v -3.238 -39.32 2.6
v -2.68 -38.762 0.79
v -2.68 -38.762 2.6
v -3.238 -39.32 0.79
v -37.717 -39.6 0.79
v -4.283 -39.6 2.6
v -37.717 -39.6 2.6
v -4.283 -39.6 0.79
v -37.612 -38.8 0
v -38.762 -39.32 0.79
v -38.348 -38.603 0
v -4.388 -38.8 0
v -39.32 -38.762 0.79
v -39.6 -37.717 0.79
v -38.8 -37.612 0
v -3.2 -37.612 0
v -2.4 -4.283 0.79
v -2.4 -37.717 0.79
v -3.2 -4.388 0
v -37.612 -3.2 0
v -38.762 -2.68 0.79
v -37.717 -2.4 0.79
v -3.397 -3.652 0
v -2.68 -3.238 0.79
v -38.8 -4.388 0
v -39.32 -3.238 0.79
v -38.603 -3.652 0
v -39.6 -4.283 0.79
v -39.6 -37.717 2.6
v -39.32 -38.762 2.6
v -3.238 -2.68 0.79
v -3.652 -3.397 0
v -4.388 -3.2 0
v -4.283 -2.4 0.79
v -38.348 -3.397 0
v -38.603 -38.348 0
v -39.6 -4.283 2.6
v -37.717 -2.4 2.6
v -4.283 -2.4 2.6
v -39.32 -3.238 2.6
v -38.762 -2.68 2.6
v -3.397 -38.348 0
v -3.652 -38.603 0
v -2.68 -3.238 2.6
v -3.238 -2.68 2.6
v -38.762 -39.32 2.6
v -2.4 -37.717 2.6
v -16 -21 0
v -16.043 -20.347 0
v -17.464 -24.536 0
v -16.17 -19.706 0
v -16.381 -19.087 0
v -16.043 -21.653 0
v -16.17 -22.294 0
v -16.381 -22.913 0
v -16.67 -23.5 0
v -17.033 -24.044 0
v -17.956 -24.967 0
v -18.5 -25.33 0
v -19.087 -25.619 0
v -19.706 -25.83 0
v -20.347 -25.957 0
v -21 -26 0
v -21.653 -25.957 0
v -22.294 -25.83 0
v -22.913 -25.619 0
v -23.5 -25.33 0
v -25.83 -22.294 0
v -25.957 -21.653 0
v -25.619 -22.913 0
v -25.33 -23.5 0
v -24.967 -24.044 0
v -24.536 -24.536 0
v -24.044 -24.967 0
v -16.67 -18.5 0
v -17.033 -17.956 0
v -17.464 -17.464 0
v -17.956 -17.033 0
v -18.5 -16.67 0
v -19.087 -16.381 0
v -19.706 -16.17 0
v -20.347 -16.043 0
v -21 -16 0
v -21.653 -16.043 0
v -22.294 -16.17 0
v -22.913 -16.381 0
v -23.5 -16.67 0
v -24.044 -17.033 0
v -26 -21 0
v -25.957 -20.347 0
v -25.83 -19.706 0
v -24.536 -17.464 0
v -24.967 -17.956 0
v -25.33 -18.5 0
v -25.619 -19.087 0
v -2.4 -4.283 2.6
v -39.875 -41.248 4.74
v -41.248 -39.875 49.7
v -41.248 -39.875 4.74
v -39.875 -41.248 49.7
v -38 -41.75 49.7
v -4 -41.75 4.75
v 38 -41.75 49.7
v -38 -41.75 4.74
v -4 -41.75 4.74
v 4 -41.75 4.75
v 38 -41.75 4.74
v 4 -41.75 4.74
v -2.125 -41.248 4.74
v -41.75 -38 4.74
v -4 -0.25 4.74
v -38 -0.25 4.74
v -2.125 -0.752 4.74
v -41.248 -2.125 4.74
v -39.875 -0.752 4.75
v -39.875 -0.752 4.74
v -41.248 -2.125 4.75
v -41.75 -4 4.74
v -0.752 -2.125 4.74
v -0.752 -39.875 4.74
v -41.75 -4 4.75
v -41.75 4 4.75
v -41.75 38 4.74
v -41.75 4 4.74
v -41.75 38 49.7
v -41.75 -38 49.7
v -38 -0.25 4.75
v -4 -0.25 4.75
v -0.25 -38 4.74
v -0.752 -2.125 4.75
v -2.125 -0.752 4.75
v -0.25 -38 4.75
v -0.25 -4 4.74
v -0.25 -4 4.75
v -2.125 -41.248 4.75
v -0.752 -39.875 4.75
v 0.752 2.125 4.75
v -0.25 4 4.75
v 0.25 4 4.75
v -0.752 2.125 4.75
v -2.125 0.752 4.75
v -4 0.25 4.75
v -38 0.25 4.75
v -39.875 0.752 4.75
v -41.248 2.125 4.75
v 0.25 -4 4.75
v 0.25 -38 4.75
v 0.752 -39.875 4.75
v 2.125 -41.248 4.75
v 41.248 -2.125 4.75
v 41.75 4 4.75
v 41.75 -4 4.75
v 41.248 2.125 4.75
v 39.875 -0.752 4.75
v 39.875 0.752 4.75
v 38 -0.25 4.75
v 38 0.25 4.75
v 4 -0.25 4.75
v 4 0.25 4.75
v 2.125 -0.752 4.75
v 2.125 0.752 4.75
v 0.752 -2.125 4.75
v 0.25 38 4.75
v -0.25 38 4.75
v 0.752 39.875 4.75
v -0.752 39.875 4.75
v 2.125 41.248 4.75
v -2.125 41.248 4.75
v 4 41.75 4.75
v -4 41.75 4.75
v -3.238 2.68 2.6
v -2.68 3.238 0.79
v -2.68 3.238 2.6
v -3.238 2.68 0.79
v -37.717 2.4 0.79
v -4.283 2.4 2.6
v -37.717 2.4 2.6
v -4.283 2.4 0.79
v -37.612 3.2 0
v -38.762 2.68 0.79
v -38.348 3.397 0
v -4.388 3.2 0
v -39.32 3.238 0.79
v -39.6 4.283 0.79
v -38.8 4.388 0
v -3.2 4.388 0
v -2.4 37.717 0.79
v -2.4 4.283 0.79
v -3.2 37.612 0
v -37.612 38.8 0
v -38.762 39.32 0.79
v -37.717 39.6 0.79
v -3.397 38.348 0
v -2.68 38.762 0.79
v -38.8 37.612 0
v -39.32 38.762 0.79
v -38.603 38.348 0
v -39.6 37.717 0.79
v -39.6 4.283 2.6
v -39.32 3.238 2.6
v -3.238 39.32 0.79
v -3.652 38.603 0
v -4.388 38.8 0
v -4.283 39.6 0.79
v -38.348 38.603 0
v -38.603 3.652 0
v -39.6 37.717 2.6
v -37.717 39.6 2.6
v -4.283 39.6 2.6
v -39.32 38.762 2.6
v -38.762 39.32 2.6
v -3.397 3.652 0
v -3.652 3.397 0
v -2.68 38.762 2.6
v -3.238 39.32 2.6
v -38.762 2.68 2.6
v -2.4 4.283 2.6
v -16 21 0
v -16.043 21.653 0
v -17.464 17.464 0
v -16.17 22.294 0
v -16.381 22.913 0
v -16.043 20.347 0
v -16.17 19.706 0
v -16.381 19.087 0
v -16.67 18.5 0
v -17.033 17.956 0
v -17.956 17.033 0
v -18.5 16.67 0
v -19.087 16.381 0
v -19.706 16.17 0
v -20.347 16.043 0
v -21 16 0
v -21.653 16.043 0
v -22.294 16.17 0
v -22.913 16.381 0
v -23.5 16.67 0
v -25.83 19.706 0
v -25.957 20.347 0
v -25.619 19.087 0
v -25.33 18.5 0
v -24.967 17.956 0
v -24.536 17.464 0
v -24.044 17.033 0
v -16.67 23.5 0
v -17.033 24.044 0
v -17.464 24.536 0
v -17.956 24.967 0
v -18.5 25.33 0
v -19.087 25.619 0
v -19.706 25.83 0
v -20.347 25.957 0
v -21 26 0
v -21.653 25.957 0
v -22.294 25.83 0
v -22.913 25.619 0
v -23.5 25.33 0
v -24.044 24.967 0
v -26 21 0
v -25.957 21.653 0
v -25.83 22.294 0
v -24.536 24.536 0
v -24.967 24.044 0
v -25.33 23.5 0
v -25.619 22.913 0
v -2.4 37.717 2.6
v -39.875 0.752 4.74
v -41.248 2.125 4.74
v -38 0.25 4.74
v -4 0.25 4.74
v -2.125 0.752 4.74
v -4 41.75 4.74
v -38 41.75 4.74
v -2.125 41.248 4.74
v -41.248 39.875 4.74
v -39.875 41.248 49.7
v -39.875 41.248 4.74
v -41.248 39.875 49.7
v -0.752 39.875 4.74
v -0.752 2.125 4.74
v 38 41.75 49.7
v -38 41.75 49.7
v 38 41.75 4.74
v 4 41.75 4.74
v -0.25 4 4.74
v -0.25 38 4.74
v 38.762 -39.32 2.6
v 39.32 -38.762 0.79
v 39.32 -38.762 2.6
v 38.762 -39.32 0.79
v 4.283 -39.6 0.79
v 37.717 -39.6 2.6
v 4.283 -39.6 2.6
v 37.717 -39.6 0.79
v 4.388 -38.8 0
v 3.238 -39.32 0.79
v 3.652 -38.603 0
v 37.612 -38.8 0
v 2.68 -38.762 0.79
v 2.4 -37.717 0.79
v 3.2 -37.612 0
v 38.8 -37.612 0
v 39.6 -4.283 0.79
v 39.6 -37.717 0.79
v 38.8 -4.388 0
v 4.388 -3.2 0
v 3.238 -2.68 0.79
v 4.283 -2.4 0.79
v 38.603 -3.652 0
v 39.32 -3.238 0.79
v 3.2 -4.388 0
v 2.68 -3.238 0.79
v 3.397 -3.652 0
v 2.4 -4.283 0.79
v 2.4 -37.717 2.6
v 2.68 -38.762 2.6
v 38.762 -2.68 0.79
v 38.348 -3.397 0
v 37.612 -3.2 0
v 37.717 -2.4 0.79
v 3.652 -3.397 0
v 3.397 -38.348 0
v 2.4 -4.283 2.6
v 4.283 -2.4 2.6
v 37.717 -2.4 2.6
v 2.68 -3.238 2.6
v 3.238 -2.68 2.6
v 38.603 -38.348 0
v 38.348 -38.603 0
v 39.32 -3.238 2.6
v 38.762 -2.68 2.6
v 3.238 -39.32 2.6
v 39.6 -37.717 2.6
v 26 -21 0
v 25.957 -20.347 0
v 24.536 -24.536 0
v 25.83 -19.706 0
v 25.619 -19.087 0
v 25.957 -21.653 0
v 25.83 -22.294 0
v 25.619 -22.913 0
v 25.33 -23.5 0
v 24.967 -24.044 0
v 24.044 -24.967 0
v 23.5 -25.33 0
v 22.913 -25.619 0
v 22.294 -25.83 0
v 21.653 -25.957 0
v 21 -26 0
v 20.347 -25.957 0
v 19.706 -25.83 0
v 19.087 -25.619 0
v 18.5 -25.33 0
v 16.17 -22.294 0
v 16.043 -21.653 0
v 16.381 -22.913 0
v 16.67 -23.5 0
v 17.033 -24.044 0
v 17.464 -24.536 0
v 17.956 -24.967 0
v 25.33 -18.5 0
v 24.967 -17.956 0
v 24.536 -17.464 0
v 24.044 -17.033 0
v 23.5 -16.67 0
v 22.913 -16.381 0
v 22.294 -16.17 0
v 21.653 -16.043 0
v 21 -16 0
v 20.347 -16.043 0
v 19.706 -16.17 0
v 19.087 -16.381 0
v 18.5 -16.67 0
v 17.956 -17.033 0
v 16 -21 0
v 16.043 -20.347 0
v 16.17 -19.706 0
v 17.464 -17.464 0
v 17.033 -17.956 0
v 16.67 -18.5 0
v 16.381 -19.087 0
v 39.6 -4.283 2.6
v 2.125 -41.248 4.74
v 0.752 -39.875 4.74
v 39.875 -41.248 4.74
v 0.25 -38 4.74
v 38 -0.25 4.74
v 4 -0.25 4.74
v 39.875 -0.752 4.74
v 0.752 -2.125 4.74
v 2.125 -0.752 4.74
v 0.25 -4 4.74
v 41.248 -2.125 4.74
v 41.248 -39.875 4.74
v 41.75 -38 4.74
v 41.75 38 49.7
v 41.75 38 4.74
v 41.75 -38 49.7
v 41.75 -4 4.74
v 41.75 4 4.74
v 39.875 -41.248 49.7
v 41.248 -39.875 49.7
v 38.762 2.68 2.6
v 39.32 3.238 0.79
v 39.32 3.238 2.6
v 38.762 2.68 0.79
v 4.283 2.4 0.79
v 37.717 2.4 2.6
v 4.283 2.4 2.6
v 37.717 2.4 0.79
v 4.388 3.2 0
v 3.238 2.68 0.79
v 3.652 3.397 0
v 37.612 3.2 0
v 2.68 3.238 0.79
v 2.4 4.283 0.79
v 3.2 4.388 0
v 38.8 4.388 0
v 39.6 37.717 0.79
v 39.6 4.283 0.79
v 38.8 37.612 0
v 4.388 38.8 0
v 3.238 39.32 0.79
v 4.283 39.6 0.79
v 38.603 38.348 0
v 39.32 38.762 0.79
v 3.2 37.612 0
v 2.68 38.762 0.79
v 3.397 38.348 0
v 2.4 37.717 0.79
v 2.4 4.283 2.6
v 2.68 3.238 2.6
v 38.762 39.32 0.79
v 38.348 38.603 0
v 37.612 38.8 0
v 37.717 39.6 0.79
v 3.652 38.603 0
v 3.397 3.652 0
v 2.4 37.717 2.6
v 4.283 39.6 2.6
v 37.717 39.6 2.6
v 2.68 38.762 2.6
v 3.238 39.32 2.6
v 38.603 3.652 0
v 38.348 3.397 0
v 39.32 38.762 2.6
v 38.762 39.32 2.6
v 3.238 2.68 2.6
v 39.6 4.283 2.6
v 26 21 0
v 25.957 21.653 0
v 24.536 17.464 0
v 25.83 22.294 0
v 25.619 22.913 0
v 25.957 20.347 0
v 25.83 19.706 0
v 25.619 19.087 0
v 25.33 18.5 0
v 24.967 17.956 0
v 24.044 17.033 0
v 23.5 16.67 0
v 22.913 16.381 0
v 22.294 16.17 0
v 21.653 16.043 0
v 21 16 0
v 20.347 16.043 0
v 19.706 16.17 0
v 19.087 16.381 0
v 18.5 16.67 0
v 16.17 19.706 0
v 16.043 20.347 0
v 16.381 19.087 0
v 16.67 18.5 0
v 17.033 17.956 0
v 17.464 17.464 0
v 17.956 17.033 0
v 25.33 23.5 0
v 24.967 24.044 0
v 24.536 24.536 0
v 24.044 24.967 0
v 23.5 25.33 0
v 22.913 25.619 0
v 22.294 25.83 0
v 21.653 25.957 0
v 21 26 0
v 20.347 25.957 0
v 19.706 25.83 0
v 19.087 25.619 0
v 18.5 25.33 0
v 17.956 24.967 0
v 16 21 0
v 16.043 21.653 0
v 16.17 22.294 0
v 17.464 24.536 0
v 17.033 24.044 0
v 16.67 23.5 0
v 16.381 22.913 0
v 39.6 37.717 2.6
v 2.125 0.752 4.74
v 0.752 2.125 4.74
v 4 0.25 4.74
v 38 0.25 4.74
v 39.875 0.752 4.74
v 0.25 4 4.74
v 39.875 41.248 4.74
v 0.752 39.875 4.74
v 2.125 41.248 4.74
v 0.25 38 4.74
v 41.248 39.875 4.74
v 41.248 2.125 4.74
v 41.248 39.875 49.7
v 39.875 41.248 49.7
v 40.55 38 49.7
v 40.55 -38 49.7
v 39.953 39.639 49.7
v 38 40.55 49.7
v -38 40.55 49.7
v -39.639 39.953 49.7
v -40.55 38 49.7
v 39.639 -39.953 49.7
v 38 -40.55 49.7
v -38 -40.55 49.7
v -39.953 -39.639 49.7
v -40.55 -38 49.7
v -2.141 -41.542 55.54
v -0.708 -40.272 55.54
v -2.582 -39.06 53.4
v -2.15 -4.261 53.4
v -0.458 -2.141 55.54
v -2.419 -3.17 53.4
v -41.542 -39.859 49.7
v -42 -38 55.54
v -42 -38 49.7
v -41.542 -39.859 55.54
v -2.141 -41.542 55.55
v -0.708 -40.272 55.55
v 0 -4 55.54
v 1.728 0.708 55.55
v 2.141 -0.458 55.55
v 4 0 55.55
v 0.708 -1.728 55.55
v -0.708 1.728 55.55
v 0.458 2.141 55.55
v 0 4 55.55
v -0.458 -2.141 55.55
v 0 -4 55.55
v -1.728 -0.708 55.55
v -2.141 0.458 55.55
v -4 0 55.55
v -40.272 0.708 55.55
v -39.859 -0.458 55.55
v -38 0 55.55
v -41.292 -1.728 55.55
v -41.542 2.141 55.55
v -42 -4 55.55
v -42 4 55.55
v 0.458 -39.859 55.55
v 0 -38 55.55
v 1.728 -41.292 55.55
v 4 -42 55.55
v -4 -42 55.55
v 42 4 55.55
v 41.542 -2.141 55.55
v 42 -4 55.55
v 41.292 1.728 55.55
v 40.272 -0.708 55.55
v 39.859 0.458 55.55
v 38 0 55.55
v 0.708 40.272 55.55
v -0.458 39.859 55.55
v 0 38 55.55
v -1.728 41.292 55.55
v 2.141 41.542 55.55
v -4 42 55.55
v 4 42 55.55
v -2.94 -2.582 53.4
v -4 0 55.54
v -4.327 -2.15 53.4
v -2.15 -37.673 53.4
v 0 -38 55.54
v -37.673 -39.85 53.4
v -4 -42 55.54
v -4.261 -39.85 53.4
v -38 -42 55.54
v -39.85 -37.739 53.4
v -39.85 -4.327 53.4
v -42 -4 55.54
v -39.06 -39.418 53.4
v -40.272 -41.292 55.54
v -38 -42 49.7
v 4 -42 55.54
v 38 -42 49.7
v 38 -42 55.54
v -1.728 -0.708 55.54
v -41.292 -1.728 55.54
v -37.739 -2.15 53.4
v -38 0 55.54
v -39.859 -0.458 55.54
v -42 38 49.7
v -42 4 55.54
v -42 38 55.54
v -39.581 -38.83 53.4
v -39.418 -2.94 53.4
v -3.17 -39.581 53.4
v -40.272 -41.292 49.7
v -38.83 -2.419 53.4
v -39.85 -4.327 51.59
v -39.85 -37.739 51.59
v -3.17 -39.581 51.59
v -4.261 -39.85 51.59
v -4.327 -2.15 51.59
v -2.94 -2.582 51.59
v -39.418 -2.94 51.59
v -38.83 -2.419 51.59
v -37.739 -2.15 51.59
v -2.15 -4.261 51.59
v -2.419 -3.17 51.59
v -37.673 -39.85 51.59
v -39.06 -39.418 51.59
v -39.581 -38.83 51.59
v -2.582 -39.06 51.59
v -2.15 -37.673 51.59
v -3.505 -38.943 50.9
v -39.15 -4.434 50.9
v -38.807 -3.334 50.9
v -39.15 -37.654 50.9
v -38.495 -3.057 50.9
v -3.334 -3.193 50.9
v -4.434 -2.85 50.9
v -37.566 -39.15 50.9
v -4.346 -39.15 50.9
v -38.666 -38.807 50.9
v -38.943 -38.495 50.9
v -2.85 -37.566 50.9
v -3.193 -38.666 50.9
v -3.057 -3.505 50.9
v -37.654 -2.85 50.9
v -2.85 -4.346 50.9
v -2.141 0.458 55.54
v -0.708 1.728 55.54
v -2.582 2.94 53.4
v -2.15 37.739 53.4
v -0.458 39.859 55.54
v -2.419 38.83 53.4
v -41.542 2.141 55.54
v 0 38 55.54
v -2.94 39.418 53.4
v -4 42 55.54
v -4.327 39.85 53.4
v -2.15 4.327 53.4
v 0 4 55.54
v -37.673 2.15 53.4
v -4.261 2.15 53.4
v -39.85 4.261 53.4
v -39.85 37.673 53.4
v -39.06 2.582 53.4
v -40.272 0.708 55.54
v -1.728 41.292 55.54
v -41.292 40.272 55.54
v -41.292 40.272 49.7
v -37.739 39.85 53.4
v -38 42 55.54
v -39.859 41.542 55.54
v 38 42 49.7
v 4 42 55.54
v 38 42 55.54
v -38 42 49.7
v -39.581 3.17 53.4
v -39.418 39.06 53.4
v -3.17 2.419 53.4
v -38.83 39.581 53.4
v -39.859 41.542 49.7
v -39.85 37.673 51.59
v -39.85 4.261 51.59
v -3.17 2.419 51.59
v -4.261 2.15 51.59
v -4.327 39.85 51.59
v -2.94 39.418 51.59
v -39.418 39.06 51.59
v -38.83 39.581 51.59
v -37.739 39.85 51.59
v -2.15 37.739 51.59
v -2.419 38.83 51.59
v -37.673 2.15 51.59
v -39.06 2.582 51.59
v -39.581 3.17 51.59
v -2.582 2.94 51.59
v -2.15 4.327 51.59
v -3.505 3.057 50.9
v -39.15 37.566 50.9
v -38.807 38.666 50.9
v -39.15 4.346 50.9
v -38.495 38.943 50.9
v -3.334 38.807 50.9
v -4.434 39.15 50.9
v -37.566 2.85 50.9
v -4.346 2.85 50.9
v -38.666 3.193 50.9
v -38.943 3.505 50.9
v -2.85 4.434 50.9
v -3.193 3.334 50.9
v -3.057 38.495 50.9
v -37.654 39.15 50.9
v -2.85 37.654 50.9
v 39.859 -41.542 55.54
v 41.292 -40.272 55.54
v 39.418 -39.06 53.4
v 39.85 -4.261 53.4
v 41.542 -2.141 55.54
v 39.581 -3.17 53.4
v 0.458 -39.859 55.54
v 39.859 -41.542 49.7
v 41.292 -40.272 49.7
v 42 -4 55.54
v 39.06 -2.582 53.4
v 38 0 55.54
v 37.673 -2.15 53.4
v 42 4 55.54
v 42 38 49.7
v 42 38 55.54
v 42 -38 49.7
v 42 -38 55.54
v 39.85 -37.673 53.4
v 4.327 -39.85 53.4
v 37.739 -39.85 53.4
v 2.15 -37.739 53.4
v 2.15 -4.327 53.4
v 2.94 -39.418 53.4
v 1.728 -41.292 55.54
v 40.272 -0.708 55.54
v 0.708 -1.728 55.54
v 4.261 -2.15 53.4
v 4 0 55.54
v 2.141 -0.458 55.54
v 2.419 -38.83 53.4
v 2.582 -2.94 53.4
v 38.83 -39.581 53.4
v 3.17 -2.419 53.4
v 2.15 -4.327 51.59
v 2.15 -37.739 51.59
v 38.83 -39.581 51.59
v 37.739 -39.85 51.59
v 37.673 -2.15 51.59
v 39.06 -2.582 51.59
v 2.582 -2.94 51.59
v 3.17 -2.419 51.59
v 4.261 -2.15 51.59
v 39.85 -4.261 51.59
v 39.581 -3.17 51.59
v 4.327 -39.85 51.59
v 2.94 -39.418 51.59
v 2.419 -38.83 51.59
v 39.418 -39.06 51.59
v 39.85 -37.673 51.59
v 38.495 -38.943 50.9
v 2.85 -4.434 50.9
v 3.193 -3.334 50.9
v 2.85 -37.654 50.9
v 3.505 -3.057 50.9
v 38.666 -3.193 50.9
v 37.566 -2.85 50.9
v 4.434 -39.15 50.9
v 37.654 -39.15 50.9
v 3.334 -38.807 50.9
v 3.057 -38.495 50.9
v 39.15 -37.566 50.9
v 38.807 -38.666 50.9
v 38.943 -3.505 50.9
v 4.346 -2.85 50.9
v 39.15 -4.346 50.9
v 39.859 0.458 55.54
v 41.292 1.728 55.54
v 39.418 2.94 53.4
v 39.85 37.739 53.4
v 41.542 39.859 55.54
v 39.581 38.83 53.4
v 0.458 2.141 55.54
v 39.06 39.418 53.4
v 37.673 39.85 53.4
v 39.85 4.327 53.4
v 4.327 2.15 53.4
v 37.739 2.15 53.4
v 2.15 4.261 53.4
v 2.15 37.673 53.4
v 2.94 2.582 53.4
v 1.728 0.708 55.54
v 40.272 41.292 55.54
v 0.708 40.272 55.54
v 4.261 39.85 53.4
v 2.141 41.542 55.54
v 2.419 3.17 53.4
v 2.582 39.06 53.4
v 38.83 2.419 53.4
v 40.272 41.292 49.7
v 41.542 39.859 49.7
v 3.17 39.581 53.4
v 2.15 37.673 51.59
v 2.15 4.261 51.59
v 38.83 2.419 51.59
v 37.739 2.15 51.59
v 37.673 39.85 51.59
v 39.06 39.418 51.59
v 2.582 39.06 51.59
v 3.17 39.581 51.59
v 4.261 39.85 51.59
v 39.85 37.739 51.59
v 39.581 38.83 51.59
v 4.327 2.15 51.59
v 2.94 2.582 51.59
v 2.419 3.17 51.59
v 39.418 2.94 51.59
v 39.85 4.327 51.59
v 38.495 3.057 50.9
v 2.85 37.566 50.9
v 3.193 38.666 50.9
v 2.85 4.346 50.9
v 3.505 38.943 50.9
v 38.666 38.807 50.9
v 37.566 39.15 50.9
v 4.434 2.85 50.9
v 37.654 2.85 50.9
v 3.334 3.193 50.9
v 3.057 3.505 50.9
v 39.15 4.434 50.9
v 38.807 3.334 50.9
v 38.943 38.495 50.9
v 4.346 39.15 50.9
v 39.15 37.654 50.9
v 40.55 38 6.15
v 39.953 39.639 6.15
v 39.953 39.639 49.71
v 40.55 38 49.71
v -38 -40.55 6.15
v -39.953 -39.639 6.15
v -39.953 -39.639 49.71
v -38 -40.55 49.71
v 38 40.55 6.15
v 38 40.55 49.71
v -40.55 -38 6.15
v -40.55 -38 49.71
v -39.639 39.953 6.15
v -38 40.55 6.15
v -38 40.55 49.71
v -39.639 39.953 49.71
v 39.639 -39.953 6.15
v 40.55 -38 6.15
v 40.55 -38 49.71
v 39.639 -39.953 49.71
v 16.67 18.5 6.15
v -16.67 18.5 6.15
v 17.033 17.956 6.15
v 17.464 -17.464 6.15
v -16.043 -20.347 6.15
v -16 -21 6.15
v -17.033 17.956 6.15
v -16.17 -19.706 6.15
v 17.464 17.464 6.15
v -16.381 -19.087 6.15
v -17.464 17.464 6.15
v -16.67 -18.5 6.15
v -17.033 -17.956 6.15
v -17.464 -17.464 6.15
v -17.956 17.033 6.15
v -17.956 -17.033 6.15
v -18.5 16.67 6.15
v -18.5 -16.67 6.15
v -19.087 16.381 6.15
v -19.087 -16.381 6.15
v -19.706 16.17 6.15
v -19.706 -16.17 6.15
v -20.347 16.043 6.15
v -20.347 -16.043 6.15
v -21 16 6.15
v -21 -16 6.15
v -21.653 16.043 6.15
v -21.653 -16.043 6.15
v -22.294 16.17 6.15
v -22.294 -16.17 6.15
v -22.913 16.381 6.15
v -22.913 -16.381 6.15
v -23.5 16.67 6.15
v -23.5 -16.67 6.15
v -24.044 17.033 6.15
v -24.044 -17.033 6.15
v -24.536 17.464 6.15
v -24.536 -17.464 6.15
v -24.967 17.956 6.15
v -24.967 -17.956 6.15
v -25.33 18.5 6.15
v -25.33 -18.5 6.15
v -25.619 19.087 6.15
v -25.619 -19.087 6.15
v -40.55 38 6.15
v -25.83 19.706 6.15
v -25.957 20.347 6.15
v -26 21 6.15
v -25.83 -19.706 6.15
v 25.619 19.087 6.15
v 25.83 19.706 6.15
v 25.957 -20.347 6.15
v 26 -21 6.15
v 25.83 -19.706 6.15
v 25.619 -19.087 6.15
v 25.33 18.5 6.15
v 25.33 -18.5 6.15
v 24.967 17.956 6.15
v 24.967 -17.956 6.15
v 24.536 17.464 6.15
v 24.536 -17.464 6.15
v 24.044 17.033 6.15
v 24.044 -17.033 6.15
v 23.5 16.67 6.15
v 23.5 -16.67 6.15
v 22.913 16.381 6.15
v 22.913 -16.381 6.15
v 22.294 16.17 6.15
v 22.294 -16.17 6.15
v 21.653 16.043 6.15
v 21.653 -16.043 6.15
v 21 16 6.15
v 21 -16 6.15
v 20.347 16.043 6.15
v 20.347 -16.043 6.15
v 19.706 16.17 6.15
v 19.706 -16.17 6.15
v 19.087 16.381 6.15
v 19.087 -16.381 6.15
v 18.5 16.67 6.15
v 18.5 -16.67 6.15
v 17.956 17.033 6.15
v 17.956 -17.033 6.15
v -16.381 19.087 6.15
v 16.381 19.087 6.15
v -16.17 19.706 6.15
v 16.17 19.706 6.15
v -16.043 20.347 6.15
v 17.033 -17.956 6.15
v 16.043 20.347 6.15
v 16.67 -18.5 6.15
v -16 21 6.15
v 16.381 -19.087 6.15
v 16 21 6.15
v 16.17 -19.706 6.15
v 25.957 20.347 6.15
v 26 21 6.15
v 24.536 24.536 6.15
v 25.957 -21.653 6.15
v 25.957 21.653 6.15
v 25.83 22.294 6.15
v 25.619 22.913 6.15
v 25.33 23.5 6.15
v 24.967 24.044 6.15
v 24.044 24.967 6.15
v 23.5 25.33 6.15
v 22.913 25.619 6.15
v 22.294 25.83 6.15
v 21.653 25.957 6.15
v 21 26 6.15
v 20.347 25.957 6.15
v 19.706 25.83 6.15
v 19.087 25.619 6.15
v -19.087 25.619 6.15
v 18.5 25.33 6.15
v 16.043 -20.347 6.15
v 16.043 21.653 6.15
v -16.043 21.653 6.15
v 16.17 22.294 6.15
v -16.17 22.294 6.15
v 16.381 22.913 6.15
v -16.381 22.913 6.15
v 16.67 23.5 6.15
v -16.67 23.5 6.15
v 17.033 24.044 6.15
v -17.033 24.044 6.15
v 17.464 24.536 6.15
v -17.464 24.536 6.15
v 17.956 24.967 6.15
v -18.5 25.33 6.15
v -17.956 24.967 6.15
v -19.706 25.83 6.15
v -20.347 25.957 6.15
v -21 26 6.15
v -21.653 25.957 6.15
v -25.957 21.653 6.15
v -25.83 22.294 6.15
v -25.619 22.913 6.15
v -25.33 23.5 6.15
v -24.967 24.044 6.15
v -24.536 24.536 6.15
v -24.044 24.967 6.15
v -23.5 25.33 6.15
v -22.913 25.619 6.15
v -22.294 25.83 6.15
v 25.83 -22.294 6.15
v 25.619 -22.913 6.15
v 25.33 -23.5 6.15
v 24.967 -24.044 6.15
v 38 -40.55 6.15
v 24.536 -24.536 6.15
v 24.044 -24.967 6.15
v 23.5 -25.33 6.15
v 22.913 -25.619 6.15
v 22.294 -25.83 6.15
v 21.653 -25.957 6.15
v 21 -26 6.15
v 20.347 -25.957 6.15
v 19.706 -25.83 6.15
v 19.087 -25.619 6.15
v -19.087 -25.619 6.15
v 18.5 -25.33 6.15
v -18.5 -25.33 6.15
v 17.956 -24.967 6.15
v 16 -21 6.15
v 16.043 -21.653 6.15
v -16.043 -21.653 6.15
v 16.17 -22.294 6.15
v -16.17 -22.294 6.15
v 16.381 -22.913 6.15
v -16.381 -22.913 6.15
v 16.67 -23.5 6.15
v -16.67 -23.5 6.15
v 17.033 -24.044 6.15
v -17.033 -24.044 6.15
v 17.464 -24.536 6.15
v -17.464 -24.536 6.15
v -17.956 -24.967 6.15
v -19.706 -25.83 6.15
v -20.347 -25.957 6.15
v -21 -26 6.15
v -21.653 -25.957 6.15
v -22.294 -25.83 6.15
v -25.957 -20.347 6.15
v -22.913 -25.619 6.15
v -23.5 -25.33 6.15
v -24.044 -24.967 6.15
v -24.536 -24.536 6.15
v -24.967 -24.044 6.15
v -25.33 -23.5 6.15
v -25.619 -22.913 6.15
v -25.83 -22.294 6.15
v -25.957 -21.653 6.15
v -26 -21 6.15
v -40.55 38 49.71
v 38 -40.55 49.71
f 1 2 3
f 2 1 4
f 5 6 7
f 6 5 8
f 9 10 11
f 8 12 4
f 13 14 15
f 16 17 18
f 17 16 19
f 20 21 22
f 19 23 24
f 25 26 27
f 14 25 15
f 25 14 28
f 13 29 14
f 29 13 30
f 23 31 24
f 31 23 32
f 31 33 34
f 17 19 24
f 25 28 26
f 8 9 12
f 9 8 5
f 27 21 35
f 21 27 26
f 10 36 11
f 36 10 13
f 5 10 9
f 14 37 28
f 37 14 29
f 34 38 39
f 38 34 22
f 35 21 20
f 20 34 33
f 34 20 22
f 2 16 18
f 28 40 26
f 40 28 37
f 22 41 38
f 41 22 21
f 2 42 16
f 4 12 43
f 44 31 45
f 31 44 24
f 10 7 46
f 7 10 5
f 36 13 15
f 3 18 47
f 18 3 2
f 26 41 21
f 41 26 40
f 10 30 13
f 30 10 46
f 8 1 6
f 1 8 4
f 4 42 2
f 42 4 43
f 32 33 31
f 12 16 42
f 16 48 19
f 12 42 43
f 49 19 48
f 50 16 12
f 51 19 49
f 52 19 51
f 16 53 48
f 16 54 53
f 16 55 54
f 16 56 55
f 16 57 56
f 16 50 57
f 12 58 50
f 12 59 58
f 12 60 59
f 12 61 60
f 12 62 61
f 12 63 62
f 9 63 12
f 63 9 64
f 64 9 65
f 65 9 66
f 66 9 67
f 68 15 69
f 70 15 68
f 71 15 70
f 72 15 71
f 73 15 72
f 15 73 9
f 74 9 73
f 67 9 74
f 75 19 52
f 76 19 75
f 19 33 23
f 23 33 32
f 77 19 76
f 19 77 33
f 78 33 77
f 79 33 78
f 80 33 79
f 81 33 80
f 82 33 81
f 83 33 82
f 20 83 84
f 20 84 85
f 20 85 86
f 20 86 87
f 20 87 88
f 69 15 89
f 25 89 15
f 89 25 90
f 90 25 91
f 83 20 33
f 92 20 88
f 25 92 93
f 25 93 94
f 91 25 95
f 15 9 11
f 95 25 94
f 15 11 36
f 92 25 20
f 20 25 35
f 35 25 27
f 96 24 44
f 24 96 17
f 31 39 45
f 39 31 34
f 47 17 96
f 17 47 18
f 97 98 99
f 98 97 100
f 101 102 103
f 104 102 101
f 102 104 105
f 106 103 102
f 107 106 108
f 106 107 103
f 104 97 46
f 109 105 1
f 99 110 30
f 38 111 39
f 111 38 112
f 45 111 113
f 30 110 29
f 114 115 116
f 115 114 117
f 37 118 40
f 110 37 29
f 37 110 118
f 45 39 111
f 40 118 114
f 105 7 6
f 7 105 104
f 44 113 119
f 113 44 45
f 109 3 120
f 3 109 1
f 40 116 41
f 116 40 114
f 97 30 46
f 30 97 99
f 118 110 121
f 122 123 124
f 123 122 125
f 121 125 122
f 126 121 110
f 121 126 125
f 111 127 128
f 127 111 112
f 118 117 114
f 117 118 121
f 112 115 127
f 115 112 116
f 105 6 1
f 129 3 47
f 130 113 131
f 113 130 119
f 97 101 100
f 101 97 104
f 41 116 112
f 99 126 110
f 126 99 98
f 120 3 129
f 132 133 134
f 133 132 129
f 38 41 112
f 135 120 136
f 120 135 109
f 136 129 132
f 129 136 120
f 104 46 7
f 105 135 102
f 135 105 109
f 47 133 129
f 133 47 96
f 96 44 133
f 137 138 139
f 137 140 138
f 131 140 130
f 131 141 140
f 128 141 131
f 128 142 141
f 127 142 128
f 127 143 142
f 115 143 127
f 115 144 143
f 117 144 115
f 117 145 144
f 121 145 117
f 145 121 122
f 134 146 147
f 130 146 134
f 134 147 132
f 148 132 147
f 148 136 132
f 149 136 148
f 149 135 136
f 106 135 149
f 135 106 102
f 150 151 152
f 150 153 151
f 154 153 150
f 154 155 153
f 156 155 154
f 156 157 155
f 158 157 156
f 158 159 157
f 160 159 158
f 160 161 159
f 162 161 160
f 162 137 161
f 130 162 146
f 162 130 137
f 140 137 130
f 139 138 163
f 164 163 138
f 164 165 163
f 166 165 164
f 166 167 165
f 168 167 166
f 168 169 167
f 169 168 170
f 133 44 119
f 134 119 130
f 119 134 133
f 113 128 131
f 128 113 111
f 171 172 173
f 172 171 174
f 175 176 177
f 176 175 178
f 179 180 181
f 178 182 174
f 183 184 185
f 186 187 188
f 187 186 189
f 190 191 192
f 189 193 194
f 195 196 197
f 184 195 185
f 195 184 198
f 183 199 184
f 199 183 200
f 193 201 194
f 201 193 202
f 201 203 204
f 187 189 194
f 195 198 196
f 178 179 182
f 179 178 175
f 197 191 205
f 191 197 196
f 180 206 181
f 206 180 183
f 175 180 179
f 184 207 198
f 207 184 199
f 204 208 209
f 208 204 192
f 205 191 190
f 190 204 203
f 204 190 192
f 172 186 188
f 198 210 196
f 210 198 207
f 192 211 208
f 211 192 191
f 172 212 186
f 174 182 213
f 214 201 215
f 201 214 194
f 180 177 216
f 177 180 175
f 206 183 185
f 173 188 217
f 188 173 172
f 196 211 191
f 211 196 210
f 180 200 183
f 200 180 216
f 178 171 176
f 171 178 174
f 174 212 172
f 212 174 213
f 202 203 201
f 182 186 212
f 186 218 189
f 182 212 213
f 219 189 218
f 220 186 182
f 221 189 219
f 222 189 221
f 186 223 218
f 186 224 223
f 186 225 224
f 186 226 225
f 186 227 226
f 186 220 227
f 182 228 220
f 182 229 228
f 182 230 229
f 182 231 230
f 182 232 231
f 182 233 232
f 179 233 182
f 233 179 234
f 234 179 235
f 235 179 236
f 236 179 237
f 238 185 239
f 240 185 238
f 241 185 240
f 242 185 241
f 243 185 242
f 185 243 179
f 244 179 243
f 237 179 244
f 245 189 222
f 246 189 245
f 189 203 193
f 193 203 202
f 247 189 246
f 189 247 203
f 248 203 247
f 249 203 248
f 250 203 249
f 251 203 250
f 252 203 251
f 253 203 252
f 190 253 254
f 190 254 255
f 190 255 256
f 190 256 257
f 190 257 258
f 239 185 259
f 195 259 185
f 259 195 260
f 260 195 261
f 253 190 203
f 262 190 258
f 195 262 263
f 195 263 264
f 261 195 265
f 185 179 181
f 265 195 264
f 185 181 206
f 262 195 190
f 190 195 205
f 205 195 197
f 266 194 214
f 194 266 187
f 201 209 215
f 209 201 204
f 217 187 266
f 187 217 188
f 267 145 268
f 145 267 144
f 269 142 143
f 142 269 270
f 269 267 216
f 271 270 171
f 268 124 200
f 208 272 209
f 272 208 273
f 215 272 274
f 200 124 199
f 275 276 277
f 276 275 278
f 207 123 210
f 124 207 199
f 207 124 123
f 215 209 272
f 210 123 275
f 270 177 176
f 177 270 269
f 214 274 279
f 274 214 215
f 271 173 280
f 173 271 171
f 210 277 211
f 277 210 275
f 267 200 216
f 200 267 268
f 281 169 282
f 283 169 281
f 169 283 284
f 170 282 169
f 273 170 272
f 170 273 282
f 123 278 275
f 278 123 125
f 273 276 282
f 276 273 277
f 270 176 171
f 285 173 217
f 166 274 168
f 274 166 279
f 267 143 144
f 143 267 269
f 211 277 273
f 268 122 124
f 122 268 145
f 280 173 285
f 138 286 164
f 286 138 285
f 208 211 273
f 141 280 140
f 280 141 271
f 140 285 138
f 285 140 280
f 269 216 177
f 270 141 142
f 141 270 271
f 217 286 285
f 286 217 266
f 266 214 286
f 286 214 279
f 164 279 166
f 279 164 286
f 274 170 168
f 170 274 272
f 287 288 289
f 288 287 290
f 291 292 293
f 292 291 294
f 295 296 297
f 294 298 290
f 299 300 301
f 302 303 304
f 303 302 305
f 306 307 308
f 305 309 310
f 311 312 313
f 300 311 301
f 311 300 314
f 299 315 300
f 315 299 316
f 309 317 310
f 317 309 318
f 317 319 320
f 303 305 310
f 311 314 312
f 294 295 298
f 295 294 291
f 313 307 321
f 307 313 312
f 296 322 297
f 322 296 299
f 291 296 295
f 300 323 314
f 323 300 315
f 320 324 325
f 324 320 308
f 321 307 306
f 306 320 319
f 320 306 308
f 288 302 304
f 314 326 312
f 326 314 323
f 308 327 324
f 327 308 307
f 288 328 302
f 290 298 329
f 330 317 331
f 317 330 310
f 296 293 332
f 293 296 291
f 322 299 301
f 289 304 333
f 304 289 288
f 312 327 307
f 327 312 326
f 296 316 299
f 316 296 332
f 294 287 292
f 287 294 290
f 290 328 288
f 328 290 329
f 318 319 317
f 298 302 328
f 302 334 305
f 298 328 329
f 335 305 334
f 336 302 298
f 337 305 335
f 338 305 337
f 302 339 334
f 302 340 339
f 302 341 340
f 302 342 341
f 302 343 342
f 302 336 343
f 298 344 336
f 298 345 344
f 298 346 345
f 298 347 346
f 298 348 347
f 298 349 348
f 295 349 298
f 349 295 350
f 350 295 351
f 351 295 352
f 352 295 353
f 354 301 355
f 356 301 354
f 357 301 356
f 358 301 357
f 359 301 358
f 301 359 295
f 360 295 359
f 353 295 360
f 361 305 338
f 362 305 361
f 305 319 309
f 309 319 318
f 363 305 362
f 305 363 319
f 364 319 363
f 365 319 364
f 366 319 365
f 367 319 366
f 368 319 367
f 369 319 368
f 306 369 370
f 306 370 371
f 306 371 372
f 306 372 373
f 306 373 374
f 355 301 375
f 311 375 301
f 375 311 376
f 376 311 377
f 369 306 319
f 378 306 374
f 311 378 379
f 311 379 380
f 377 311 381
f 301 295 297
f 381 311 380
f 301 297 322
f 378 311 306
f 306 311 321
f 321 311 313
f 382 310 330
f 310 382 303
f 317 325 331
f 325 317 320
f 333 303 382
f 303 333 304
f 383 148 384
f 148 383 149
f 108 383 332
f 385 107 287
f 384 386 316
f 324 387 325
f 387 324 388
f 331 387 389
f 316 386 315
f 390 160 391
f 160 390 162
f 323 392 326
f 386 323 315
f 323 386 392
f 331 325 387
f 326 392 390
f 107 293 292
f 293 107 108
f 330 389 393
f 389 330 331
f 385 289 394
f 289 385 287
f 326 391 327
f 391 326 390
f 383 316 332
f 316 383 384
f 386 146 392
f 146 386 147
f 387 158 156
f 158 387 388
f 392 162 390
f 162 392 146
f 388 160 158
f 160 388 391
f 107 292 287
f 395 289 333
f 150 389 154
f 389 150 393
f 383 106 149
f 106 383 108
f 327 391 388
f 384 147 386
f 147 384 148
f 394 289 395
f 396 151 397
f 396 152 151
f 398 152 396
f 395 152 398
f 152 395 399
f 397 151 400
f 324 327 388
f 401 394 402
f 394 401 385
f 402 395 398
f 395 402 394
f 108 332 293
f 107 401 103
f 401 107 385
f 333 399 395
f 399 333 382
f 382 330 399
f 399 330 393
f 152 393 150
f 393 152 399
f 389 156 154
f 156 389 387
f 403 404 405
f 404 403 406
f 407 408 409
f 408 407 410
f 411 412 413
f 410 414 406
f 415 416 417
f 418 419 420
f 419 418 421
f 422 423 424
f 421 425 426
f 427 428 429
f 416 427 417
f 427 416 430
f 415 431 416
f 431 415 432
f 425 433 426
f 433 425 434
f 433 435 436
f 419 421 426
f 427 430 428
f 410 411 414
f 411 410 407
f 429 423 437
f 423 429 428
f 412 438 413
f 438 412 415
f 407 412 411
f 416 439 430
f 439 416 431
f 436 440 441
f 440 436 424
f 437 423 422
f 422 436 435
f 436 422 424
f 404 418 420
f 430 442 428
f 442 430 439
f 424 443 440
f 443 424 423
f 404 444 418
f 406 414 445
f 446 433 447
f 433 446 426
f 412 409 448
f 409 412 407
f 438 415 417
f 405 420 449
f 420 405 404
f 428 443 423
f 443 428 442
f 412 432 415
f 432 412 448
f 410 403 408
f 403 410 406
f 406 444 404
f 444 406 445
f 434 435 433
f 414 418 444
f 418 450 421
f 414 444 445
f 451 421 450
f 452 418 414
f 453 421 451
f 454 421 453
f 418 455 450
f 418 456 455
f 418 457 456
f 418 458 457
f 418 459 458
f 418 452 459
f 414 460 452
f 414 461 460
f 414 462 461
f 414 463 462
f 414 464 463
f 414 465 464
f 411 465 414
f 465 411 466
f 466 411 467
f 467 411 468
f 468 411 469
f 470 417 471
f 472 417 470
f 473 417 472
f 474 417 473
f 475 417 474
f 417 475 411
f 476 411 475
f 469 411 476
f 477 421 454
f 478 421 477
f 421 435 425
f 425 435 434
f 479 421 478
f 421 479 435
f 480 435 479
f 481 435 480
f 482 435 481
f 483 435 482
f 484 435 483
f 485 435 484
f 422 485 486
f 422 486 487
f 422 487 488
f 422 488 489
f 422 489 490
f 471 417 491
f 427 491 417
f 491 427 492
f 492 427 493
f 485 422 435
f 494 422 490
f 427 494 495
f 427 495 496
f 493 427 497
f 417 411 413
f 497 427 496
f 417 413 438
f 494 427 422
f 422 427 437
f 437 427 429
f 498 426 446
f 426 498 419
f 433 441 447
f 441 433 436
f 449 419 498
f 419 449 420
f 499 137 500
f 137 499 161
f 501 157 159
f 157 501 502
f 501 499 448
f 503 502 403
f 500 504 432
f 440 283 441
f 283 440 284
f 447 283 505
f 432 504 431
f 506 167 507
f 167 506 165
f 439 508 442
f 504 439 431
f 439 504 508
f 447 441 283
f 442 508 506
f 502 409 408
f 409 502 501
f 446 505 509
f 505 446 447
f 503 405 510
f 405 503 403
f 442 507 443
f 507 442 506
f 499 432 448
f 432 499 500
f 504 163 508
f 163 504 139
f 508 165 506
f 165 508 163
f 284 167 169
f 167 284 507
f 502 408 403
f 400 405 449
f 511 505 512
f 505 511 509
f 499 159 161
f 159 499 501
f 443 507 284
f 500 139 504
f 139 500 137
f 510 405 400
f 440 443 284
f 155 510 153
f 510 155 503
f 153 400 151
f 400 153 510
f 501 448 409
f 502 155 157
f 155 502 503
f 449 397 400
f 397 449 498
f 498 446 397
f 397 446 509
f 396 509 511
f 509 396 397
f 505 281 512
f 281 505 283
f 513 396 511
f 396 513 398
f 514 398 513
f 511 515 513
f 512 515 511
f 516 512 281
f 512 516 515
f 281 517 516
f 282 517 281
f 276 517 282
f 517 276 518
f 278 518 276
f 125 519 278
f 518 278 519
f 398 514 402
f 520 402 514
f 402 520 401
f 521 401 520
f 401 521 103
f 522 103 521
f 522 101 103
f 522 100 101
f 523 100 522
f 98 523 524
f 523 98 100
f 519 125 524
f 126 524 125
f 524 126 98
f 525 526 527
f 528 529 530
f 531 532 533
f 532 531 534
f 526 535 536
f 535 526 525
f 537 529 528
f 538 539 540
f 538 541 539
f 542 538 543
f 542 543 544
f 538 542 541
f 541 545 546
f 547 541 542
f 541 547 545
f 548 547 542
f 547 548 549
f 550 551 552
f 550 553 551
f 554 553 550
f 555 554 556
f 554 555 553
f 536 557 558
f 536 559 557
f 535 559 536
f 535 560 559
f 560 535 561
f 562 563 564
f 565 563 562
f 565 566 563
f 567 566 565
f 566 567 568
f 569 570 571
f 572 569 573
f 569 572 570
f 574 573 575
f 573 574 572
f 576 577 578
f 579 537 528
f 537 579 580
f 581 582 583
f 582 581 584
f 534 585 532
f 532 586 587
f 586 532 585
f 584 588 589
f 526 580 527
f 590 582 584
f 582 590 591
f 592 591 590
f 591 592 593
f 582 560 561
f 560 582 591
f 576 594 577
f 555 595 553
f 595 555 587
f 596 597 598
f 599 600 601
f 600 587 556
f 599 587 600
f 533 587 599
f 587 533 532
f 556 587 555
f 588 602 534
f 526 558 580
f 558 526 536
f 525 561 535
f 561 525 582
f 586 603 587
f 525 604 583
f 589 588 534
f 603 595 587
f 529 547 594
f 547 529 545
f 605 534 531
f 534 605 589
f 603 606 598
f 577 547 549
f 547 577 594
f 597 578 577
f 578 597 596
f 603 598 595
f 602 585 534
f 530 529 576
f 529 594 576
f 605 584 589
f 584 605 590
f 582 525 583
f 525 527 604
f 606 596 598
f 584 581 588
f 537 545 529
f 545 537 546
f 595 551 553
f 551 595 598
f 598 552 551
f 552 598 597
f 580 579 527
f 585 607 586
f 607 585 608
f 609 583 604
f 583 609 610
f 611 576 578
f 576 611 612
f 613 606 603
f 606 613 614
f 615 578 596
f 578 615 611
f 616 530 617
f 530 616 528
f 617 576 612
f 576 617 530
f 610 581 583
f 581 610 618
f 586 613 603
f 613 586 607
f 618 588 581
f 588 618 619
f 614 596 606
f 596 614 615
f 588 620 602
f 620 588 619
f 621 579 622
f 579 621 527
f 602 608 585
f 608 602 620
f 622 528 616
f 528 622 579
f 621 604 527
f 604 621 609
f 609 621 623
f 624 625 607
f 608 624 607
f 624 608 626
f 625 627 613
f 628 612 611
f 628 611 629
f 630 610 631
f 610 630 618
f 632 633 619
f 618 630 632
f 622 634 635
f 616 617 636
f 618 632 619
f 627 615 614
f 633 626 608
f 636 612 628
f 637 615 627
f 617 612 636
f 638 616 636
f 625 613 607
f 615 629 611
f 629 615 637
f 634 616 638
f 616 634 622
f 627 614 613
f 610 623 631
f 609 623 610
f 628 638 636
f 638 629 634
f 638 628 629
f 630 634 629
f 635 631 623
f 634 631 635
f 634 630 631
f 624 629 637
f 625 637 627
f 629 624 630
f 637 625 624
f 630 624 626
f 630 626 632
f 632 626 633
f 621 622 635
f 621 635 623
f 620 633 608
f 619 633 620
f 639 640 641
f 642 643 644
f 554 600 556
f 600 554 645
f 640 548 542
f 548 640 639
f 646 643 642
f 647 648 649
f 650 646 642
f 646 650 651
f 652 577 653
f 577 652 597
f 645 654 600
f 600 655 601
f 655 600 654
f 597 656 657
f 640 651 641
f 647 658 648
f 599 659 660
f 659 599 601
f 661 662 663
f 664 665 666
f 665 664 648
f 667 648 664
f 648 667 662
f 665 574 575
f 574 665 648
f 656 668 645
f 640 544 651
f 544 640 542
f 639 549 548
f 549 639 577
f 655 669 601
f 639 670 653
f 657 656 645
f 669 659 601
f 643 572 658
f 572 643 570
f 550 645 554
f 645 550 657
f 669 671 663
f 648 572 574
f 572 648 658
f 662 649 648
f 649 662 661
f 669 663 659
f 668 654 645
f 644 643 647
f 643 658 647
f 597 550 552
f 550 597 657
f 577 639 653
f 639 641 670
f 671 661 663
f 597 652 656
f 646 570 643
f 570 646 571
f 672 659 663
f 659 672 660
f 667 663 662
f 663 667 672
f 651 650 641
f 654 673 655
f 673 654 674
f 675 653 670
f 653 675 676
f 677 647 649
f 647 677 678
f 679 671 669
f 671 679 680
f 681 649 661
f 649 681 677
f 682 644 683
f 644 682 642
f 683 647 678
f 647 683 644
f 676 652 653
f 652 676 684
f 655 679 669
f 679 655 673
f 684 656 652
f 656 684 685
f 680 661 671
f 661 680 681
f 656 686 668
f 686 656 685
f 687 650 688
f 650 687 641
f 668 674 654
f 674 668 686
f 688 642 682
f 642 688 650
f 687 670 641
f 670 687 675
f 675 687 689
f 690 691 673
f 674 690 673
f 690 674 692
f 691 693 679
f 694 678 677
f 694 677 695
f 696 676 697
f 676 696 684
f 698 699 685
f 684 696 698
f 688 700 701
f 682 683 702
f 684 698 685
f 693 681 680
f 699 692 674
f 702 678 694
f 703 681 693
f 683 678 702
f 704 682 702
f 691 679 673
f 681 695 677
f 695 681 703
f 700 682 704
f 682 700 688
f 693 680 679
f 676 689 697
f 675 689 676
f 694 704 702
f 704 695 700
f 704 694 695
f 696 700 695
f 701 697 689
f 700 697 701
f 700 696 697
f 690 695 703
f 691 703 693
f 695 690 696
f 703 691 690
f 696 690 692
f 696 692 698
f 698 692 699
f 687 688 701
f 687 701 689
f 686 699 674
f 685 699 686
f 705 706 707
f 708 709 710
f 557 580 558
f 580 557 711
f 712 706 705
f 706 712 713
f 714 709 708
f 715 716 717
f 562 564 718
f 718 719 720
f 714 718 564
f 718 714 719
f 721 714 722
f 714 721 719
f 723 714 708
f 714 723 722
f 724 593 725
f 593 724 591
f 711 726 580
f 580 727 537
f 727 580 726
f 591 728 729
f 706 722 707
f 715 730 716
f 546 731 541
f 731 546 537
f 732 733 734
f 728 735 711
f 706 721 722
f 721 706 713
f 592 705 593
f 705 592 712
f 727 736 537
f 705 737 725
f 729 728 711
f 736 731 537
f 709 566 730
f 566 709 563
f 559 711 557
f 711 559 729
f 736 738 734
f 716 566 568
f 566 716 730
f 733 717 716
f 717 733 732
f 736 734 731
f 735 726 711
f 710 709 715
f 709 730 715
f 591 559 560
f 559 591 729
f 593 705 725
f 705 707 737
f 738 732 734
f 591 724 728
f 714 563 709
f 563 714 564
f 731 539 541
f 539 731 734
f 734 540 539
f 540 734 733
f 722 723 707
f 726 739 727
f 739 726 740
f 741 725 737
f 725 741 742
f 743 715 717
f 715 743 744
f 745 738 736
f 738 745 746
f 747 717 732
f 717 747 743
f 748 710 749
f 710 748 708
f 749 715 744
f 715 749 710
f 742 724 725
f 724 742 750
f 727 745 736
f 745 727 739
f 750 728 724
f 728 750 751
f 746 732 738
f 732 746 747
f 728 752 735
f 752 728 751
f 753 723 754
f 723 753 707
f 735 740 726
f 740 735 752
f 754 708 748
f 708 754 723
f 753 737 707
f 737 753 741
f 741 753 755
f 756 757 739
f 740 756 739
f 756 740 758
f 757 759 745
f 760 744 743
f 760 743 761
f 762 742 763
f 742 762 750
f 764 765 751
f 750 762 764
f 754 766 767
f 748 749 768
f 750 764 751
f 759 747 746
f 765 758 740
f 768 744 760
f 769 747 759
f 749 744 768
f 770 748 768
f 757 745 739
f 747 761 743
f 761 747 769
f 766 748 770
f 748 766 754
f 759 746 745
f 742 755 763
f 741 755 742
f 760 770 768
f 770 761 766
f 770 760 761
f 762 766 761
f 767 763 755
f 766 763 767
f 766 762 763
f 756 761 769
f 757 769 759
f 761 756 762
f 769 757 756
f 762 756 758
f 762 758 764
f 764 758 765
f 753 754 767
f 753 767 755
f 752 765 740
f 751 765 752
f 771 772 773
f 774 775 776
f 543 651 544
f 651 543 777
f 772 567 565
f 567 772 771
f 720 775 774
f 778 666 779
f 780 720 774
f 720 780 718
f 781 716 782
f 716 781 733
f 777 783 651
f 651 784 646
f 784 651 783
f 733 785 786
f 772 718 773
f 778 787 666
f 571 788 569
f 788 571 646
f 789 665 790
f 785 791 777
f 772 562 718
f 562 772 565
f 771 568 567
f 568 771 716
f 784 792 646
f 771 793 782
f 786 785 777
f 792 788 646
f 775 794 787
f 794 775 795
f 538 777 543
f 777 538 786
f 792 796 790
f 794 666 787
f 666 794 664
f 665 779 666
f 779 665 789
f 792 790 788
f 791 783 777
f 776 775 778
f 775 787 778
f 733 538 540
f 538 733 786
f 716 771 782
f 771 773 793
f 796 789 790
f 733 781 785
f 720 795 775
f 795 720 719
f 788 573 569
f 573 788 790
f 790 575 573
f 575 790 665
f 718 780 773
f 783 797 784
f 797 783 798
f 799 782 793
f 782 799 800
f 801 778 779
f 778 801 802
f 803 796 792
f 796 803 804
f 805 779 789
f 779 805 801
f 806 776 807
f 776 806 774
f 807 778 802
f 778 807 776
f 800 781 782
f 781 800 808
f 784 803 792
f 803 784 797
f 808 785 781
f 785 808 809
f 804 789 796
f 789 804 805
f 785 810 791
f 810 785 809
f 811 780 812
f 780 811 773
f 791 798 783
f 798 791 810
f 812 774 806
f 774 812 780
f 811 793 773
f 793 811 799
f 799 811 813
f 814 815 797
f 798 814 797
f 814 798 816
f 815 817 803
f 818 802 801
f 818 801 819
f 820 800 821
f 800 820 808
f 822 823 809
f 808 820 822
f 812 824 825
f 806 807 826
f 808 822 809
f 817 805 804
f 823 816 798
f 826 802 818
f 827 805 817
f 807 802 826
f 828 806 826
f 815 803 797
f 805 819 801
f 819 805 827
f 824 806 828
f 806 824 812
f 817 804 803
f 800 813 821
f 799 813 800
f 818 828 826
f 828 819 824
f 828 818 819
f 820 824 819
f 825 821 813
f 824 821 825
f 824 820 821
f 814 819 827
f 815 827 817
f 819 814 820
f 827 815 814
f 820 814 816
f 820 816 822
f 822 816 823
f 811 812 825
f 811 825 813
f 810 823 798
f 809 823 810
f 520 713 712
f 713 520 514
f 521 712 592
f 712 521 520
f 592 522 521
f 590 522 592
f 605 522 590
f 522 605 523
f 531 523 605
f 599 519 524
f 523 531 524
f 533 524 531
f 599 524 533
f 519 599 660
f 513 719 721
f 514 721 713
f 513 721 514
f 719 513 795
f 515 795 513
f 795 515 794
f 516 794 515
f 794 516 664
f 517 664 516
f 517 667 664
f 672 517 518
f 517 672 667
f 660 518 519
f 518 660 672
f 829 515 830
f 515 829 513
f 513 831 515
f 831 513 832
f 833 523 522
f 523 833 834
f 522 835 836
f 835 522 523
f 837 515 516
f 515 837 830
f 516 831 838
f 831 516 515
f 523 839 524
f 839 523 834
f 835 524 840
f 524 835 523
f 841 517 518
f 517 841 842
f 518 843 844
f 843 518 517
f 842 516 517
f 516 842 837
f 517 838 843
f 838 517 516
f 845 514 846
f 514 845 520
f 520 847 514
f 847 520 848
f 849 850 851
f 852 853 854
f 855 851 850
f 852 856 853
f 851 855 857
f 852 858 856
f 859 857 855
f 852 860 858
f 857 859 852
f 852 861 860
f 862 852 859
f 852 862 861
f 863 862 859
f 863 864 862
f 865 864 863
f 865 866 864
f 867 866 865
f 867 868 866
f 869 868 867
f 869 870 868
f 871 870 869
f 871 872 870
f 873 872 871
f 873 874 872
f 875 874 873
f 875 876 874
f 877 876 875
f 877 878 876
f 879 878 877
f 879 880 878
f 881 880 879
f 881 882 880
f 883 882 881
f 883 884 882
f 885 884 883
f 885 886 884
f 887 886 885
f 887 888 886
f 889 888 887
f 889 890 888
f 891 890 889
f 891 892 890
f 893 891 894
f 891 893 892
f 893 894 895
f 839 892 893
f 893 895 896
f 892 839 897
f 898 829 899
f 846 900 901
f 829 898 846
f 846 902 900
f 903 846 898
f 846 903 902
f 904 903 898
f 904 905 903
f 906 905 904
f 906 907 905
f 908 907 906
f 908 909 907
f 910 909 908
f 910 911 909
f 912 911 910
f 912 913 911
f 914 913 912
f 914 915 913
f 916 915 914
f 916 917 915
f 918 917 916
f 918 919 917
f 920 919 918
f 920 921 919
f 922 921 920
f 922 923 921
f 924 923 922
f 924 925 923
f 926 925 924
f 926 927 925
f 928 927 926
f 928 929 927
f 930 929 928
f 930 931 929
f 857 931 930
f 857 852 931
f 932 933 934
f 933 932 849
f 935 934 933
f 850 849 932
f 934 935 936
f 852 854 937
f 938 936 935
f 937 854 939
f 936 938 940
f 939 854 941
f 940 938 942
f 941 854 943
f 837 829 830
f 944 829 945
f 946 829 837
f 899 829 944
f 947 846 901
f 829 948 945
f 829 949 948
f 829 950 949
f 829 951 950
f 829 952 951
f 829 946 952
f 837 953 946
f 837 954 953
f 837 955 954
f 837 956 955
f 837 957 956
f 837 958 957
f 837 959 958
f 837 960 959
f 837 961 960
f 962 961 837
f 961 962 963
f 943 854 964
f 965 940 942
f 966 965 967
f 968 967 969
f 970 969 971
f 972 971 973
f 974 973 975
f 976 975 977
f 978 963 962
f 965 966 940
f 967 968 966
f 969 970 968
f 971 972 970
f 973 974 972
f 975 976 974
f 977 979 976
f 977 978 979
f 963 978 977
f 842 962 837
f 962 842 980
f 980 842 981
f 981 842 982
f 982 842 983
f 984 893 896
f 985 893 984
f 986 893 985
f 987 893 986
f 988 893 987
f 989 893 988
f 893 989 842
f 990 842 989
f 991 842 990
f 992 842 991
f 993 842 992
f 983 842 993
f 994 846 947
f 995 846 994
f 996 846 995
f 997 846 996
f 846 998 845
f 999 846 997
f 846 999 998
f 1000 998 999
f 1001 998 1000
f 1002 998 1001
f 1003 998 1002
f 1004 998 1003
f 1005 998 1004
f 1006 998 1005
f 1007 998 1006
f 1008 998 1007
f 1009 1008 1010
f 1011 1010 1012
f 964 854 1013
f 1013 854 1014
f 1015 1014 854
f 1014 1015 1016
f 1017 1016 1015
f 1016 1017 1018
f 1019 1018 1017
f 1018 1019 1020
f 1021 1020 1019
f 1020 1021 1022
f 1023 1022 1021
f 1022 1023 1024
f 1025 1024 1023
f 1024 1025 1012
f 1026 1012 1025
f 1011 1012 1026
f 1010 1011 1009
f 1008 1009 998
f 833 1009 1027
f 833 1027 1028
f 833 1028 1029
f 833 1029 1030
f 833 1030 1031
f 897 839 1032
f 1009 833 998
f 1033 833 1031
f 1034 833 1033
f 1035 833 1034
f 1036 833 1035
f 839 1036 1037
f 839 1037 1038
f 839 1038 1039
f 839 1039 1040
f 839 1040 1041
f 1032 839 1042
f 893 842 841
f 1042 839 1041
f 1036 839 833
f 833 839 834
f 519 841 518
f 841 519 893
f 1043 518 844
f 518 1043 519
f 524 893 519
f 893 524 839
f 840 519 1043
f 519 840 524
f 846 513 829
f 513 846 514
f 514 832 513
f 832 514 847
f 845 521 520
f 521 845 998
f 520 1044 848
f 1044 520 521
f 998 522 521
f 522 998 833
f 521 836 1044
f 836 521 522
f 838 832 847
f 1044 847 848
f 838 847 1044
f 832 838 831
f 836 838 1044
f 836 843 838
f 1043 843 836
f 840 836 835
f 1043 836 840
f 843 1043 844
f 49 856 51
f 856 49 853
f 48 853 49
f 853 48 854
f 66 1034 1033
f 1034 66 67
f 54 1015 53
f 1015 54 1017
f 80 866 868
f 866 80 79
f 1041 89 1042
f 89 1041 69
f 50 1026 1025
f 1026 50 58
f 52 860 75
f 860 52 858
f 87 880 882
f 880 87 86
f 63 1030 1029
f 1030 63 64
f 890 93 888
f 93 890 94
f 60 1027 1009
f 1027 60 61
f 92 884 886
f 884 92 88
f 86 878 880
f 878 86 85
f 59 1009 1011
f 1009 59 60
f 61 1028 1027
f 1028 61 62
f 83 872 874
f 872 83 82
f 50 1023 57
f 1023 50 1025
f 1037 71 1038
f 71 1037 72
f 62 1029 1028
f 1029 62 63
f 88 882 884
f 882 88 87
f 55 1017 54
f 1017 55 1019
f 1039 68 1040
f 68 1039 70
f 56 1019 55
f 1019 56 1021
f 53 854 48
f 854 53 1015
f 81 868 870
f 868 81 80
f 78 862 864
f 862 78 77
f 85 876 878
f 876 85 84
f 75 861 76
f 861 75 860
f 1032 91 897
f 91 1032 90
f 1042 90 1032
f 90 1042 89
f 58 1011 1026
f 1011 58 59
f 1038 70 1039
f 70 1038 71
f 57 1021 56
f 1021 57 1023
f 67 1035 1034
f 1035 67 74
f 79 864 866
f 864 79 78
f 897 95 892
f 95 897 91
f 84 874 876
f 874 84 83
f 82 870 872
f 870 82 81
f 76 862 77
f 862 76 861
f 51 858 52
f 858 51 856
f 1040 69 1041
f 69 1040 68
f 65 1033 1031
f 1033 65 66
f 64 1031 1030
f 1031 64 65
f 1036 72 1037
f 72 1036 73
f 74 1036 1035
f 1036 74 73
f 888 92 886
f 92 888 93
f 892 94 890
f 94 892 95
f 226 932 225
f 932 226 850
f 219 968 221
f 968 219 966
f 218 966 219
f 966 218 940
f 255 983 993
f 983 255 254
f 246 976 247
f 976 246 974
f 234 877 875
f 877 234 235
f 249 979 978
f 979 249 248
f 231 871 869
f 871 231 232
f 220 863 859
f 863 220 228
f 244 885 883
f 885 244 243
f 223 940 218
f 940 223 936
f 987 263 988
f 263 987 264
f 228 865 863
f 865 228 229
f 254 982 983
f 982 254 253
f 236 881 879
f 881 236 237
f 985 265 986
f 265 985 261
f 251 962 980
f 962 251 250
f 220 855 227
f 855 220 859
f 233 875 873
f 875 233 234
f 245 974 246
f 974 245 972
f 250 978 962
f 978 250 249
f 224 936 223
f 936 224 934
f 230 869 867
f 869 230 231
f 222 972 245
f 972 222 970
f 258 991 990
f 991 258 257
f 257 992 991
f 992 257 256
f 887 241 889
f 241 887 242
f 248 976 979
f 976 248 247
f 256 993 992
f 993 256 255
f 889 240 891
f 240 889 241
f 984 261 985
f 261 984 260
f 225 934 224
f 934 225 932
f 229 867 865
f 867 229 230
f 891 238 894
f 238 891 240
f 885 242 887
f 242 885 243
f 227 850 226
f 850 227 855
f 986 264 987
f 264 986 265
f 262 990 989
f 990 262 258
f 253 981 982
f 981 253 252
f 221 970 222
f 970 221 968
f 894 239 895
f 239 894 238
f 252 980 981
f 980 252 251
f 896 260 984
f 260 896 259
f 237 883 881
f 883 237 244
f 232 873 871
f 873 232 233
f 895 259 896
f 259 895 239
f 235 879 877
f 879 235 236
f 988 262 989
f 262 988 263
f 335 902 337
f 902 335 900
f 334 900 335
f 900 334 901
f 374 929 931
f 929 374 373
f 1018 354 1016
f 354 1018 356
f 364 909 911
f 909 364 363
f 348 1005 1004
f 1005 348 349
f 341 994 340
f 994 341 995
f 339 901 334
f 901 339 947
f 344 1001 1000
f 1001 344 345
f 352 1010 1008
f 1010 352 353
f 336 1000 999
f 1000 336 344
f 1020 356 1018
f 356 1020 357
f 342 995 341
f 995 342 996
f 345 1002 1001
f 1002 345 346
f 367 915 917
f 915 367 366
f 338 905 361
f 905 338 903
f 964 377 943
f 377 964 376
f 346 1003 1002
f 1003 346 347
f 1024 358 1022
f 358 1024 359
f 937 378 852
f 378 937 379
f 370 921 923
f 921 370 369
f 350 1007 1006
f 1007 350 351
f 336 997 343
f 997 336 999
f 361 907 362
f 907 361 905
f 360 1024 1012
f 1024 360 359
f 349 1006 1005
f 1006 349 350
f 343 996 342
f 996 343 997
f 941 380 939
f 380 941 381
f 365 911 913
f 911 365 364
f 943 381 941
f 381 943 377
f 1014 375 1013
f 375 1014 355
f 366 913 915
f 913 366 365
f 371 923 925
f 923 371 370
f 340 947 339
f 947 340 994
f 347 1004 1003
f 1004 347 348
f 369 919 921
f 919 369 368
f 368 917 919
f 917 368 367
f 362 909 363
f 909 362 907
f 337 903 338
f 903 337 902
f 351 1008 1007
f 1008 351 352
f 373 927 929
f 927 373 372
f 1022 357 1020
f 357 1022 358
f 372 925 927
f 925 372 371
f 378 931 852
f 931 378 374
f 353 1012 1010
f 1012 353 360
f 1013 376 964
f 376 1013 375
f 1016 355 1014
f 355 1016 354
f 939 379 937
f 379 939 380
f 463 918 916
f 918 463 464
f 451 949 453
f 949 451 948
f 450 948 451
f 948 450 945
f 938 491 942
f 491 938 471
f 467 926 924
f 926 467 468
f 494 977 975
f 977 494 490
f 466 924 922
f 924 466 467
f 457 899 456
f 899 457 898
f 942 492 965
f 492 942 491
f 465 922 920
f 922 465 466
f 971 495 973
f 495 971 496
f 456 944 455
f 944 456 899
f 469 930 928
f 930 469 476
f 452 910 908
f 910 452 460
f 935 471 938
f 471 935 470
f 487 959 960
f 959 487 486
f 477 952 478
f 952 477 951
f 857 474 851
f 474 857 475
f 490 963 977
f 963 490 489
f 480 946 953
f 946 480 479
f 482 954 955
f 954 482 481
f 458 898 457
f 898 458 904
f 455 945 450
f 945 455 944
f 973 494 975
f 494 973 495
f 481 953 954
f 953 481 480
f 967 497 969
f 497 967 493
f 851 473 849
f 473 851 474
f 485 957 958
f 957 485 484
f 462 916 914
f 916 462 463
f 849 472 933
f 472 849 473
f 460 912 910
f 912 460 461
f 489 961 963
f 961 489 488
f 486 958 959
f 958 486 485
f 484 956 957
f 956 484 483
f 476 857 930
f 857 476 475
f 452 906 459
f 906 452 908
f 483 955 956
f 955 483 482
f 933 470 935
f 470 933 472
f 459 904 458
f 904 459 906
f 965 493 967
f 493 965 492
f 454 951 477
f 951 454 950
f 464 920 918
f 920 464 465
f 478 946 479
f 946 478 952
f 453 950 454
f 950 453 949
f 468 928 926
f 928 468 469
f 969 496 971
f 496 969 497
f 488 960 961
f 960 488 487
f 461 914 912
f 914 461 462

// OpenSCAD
// riser_spacer_2in — 2" spacer that clicks UNDER a pedestal.
//
// The hot air pedestals dropped from 8" to 6" so all four fit an overnight
// print. If 6" turns out short, four of these restore the original 8" without
// reprinting the pedestals.
//
// Gridfinity feet below, a baseplate ON TOP: the pedestal's own feet drop into
// its sockets. Net rise is body + BP_H - BIN_BASE_H, because the pedestal's feet
// sink into the sockets — so the body is 49.7, not 50.8.
//
// ⚠️ The socket LOCATES, it does not latch. On a Clickfinity desk plate the
// spacer itself latches down, but the pedestal only sits in the spacer. That is
// fine under load and worth knowing when you lift one off.
//
// PRINT: as emitted, feet down. No supports.
include <../lib/gridfinity.scad>

RISE  = 50.8;   // [25.4:0.1:101.6] net height added — 2"
VENT  = 10.0;   // [0:1:20] vent through the floor. NOT optional: stack_base's
                //   cavity is otherwise sealed, which traps air and renders as a
                //   SECOND CONNECTED COMPONENT — a mesh that passes every CI check
                //   and is still wrong. Same trap riser_common documents.
BODY = RISE - (BP_H - BIN_BASE_H);

echo(str("spacer body ", BODY, " mm, part ", BODY + BP_H, " mm tall, net rise ", RISE));

difference() {
    stack_base(2, 2, BODY, open_front = false);
    if (VENT > 0)
        for (ix = [-1, 1], iy = [-1, 1])
            translate([ix*GF/2, iy*GF/2, -1]) cylinder(d = VENT, h = BIN_BASE_H + 3, $fn = 48);
}
